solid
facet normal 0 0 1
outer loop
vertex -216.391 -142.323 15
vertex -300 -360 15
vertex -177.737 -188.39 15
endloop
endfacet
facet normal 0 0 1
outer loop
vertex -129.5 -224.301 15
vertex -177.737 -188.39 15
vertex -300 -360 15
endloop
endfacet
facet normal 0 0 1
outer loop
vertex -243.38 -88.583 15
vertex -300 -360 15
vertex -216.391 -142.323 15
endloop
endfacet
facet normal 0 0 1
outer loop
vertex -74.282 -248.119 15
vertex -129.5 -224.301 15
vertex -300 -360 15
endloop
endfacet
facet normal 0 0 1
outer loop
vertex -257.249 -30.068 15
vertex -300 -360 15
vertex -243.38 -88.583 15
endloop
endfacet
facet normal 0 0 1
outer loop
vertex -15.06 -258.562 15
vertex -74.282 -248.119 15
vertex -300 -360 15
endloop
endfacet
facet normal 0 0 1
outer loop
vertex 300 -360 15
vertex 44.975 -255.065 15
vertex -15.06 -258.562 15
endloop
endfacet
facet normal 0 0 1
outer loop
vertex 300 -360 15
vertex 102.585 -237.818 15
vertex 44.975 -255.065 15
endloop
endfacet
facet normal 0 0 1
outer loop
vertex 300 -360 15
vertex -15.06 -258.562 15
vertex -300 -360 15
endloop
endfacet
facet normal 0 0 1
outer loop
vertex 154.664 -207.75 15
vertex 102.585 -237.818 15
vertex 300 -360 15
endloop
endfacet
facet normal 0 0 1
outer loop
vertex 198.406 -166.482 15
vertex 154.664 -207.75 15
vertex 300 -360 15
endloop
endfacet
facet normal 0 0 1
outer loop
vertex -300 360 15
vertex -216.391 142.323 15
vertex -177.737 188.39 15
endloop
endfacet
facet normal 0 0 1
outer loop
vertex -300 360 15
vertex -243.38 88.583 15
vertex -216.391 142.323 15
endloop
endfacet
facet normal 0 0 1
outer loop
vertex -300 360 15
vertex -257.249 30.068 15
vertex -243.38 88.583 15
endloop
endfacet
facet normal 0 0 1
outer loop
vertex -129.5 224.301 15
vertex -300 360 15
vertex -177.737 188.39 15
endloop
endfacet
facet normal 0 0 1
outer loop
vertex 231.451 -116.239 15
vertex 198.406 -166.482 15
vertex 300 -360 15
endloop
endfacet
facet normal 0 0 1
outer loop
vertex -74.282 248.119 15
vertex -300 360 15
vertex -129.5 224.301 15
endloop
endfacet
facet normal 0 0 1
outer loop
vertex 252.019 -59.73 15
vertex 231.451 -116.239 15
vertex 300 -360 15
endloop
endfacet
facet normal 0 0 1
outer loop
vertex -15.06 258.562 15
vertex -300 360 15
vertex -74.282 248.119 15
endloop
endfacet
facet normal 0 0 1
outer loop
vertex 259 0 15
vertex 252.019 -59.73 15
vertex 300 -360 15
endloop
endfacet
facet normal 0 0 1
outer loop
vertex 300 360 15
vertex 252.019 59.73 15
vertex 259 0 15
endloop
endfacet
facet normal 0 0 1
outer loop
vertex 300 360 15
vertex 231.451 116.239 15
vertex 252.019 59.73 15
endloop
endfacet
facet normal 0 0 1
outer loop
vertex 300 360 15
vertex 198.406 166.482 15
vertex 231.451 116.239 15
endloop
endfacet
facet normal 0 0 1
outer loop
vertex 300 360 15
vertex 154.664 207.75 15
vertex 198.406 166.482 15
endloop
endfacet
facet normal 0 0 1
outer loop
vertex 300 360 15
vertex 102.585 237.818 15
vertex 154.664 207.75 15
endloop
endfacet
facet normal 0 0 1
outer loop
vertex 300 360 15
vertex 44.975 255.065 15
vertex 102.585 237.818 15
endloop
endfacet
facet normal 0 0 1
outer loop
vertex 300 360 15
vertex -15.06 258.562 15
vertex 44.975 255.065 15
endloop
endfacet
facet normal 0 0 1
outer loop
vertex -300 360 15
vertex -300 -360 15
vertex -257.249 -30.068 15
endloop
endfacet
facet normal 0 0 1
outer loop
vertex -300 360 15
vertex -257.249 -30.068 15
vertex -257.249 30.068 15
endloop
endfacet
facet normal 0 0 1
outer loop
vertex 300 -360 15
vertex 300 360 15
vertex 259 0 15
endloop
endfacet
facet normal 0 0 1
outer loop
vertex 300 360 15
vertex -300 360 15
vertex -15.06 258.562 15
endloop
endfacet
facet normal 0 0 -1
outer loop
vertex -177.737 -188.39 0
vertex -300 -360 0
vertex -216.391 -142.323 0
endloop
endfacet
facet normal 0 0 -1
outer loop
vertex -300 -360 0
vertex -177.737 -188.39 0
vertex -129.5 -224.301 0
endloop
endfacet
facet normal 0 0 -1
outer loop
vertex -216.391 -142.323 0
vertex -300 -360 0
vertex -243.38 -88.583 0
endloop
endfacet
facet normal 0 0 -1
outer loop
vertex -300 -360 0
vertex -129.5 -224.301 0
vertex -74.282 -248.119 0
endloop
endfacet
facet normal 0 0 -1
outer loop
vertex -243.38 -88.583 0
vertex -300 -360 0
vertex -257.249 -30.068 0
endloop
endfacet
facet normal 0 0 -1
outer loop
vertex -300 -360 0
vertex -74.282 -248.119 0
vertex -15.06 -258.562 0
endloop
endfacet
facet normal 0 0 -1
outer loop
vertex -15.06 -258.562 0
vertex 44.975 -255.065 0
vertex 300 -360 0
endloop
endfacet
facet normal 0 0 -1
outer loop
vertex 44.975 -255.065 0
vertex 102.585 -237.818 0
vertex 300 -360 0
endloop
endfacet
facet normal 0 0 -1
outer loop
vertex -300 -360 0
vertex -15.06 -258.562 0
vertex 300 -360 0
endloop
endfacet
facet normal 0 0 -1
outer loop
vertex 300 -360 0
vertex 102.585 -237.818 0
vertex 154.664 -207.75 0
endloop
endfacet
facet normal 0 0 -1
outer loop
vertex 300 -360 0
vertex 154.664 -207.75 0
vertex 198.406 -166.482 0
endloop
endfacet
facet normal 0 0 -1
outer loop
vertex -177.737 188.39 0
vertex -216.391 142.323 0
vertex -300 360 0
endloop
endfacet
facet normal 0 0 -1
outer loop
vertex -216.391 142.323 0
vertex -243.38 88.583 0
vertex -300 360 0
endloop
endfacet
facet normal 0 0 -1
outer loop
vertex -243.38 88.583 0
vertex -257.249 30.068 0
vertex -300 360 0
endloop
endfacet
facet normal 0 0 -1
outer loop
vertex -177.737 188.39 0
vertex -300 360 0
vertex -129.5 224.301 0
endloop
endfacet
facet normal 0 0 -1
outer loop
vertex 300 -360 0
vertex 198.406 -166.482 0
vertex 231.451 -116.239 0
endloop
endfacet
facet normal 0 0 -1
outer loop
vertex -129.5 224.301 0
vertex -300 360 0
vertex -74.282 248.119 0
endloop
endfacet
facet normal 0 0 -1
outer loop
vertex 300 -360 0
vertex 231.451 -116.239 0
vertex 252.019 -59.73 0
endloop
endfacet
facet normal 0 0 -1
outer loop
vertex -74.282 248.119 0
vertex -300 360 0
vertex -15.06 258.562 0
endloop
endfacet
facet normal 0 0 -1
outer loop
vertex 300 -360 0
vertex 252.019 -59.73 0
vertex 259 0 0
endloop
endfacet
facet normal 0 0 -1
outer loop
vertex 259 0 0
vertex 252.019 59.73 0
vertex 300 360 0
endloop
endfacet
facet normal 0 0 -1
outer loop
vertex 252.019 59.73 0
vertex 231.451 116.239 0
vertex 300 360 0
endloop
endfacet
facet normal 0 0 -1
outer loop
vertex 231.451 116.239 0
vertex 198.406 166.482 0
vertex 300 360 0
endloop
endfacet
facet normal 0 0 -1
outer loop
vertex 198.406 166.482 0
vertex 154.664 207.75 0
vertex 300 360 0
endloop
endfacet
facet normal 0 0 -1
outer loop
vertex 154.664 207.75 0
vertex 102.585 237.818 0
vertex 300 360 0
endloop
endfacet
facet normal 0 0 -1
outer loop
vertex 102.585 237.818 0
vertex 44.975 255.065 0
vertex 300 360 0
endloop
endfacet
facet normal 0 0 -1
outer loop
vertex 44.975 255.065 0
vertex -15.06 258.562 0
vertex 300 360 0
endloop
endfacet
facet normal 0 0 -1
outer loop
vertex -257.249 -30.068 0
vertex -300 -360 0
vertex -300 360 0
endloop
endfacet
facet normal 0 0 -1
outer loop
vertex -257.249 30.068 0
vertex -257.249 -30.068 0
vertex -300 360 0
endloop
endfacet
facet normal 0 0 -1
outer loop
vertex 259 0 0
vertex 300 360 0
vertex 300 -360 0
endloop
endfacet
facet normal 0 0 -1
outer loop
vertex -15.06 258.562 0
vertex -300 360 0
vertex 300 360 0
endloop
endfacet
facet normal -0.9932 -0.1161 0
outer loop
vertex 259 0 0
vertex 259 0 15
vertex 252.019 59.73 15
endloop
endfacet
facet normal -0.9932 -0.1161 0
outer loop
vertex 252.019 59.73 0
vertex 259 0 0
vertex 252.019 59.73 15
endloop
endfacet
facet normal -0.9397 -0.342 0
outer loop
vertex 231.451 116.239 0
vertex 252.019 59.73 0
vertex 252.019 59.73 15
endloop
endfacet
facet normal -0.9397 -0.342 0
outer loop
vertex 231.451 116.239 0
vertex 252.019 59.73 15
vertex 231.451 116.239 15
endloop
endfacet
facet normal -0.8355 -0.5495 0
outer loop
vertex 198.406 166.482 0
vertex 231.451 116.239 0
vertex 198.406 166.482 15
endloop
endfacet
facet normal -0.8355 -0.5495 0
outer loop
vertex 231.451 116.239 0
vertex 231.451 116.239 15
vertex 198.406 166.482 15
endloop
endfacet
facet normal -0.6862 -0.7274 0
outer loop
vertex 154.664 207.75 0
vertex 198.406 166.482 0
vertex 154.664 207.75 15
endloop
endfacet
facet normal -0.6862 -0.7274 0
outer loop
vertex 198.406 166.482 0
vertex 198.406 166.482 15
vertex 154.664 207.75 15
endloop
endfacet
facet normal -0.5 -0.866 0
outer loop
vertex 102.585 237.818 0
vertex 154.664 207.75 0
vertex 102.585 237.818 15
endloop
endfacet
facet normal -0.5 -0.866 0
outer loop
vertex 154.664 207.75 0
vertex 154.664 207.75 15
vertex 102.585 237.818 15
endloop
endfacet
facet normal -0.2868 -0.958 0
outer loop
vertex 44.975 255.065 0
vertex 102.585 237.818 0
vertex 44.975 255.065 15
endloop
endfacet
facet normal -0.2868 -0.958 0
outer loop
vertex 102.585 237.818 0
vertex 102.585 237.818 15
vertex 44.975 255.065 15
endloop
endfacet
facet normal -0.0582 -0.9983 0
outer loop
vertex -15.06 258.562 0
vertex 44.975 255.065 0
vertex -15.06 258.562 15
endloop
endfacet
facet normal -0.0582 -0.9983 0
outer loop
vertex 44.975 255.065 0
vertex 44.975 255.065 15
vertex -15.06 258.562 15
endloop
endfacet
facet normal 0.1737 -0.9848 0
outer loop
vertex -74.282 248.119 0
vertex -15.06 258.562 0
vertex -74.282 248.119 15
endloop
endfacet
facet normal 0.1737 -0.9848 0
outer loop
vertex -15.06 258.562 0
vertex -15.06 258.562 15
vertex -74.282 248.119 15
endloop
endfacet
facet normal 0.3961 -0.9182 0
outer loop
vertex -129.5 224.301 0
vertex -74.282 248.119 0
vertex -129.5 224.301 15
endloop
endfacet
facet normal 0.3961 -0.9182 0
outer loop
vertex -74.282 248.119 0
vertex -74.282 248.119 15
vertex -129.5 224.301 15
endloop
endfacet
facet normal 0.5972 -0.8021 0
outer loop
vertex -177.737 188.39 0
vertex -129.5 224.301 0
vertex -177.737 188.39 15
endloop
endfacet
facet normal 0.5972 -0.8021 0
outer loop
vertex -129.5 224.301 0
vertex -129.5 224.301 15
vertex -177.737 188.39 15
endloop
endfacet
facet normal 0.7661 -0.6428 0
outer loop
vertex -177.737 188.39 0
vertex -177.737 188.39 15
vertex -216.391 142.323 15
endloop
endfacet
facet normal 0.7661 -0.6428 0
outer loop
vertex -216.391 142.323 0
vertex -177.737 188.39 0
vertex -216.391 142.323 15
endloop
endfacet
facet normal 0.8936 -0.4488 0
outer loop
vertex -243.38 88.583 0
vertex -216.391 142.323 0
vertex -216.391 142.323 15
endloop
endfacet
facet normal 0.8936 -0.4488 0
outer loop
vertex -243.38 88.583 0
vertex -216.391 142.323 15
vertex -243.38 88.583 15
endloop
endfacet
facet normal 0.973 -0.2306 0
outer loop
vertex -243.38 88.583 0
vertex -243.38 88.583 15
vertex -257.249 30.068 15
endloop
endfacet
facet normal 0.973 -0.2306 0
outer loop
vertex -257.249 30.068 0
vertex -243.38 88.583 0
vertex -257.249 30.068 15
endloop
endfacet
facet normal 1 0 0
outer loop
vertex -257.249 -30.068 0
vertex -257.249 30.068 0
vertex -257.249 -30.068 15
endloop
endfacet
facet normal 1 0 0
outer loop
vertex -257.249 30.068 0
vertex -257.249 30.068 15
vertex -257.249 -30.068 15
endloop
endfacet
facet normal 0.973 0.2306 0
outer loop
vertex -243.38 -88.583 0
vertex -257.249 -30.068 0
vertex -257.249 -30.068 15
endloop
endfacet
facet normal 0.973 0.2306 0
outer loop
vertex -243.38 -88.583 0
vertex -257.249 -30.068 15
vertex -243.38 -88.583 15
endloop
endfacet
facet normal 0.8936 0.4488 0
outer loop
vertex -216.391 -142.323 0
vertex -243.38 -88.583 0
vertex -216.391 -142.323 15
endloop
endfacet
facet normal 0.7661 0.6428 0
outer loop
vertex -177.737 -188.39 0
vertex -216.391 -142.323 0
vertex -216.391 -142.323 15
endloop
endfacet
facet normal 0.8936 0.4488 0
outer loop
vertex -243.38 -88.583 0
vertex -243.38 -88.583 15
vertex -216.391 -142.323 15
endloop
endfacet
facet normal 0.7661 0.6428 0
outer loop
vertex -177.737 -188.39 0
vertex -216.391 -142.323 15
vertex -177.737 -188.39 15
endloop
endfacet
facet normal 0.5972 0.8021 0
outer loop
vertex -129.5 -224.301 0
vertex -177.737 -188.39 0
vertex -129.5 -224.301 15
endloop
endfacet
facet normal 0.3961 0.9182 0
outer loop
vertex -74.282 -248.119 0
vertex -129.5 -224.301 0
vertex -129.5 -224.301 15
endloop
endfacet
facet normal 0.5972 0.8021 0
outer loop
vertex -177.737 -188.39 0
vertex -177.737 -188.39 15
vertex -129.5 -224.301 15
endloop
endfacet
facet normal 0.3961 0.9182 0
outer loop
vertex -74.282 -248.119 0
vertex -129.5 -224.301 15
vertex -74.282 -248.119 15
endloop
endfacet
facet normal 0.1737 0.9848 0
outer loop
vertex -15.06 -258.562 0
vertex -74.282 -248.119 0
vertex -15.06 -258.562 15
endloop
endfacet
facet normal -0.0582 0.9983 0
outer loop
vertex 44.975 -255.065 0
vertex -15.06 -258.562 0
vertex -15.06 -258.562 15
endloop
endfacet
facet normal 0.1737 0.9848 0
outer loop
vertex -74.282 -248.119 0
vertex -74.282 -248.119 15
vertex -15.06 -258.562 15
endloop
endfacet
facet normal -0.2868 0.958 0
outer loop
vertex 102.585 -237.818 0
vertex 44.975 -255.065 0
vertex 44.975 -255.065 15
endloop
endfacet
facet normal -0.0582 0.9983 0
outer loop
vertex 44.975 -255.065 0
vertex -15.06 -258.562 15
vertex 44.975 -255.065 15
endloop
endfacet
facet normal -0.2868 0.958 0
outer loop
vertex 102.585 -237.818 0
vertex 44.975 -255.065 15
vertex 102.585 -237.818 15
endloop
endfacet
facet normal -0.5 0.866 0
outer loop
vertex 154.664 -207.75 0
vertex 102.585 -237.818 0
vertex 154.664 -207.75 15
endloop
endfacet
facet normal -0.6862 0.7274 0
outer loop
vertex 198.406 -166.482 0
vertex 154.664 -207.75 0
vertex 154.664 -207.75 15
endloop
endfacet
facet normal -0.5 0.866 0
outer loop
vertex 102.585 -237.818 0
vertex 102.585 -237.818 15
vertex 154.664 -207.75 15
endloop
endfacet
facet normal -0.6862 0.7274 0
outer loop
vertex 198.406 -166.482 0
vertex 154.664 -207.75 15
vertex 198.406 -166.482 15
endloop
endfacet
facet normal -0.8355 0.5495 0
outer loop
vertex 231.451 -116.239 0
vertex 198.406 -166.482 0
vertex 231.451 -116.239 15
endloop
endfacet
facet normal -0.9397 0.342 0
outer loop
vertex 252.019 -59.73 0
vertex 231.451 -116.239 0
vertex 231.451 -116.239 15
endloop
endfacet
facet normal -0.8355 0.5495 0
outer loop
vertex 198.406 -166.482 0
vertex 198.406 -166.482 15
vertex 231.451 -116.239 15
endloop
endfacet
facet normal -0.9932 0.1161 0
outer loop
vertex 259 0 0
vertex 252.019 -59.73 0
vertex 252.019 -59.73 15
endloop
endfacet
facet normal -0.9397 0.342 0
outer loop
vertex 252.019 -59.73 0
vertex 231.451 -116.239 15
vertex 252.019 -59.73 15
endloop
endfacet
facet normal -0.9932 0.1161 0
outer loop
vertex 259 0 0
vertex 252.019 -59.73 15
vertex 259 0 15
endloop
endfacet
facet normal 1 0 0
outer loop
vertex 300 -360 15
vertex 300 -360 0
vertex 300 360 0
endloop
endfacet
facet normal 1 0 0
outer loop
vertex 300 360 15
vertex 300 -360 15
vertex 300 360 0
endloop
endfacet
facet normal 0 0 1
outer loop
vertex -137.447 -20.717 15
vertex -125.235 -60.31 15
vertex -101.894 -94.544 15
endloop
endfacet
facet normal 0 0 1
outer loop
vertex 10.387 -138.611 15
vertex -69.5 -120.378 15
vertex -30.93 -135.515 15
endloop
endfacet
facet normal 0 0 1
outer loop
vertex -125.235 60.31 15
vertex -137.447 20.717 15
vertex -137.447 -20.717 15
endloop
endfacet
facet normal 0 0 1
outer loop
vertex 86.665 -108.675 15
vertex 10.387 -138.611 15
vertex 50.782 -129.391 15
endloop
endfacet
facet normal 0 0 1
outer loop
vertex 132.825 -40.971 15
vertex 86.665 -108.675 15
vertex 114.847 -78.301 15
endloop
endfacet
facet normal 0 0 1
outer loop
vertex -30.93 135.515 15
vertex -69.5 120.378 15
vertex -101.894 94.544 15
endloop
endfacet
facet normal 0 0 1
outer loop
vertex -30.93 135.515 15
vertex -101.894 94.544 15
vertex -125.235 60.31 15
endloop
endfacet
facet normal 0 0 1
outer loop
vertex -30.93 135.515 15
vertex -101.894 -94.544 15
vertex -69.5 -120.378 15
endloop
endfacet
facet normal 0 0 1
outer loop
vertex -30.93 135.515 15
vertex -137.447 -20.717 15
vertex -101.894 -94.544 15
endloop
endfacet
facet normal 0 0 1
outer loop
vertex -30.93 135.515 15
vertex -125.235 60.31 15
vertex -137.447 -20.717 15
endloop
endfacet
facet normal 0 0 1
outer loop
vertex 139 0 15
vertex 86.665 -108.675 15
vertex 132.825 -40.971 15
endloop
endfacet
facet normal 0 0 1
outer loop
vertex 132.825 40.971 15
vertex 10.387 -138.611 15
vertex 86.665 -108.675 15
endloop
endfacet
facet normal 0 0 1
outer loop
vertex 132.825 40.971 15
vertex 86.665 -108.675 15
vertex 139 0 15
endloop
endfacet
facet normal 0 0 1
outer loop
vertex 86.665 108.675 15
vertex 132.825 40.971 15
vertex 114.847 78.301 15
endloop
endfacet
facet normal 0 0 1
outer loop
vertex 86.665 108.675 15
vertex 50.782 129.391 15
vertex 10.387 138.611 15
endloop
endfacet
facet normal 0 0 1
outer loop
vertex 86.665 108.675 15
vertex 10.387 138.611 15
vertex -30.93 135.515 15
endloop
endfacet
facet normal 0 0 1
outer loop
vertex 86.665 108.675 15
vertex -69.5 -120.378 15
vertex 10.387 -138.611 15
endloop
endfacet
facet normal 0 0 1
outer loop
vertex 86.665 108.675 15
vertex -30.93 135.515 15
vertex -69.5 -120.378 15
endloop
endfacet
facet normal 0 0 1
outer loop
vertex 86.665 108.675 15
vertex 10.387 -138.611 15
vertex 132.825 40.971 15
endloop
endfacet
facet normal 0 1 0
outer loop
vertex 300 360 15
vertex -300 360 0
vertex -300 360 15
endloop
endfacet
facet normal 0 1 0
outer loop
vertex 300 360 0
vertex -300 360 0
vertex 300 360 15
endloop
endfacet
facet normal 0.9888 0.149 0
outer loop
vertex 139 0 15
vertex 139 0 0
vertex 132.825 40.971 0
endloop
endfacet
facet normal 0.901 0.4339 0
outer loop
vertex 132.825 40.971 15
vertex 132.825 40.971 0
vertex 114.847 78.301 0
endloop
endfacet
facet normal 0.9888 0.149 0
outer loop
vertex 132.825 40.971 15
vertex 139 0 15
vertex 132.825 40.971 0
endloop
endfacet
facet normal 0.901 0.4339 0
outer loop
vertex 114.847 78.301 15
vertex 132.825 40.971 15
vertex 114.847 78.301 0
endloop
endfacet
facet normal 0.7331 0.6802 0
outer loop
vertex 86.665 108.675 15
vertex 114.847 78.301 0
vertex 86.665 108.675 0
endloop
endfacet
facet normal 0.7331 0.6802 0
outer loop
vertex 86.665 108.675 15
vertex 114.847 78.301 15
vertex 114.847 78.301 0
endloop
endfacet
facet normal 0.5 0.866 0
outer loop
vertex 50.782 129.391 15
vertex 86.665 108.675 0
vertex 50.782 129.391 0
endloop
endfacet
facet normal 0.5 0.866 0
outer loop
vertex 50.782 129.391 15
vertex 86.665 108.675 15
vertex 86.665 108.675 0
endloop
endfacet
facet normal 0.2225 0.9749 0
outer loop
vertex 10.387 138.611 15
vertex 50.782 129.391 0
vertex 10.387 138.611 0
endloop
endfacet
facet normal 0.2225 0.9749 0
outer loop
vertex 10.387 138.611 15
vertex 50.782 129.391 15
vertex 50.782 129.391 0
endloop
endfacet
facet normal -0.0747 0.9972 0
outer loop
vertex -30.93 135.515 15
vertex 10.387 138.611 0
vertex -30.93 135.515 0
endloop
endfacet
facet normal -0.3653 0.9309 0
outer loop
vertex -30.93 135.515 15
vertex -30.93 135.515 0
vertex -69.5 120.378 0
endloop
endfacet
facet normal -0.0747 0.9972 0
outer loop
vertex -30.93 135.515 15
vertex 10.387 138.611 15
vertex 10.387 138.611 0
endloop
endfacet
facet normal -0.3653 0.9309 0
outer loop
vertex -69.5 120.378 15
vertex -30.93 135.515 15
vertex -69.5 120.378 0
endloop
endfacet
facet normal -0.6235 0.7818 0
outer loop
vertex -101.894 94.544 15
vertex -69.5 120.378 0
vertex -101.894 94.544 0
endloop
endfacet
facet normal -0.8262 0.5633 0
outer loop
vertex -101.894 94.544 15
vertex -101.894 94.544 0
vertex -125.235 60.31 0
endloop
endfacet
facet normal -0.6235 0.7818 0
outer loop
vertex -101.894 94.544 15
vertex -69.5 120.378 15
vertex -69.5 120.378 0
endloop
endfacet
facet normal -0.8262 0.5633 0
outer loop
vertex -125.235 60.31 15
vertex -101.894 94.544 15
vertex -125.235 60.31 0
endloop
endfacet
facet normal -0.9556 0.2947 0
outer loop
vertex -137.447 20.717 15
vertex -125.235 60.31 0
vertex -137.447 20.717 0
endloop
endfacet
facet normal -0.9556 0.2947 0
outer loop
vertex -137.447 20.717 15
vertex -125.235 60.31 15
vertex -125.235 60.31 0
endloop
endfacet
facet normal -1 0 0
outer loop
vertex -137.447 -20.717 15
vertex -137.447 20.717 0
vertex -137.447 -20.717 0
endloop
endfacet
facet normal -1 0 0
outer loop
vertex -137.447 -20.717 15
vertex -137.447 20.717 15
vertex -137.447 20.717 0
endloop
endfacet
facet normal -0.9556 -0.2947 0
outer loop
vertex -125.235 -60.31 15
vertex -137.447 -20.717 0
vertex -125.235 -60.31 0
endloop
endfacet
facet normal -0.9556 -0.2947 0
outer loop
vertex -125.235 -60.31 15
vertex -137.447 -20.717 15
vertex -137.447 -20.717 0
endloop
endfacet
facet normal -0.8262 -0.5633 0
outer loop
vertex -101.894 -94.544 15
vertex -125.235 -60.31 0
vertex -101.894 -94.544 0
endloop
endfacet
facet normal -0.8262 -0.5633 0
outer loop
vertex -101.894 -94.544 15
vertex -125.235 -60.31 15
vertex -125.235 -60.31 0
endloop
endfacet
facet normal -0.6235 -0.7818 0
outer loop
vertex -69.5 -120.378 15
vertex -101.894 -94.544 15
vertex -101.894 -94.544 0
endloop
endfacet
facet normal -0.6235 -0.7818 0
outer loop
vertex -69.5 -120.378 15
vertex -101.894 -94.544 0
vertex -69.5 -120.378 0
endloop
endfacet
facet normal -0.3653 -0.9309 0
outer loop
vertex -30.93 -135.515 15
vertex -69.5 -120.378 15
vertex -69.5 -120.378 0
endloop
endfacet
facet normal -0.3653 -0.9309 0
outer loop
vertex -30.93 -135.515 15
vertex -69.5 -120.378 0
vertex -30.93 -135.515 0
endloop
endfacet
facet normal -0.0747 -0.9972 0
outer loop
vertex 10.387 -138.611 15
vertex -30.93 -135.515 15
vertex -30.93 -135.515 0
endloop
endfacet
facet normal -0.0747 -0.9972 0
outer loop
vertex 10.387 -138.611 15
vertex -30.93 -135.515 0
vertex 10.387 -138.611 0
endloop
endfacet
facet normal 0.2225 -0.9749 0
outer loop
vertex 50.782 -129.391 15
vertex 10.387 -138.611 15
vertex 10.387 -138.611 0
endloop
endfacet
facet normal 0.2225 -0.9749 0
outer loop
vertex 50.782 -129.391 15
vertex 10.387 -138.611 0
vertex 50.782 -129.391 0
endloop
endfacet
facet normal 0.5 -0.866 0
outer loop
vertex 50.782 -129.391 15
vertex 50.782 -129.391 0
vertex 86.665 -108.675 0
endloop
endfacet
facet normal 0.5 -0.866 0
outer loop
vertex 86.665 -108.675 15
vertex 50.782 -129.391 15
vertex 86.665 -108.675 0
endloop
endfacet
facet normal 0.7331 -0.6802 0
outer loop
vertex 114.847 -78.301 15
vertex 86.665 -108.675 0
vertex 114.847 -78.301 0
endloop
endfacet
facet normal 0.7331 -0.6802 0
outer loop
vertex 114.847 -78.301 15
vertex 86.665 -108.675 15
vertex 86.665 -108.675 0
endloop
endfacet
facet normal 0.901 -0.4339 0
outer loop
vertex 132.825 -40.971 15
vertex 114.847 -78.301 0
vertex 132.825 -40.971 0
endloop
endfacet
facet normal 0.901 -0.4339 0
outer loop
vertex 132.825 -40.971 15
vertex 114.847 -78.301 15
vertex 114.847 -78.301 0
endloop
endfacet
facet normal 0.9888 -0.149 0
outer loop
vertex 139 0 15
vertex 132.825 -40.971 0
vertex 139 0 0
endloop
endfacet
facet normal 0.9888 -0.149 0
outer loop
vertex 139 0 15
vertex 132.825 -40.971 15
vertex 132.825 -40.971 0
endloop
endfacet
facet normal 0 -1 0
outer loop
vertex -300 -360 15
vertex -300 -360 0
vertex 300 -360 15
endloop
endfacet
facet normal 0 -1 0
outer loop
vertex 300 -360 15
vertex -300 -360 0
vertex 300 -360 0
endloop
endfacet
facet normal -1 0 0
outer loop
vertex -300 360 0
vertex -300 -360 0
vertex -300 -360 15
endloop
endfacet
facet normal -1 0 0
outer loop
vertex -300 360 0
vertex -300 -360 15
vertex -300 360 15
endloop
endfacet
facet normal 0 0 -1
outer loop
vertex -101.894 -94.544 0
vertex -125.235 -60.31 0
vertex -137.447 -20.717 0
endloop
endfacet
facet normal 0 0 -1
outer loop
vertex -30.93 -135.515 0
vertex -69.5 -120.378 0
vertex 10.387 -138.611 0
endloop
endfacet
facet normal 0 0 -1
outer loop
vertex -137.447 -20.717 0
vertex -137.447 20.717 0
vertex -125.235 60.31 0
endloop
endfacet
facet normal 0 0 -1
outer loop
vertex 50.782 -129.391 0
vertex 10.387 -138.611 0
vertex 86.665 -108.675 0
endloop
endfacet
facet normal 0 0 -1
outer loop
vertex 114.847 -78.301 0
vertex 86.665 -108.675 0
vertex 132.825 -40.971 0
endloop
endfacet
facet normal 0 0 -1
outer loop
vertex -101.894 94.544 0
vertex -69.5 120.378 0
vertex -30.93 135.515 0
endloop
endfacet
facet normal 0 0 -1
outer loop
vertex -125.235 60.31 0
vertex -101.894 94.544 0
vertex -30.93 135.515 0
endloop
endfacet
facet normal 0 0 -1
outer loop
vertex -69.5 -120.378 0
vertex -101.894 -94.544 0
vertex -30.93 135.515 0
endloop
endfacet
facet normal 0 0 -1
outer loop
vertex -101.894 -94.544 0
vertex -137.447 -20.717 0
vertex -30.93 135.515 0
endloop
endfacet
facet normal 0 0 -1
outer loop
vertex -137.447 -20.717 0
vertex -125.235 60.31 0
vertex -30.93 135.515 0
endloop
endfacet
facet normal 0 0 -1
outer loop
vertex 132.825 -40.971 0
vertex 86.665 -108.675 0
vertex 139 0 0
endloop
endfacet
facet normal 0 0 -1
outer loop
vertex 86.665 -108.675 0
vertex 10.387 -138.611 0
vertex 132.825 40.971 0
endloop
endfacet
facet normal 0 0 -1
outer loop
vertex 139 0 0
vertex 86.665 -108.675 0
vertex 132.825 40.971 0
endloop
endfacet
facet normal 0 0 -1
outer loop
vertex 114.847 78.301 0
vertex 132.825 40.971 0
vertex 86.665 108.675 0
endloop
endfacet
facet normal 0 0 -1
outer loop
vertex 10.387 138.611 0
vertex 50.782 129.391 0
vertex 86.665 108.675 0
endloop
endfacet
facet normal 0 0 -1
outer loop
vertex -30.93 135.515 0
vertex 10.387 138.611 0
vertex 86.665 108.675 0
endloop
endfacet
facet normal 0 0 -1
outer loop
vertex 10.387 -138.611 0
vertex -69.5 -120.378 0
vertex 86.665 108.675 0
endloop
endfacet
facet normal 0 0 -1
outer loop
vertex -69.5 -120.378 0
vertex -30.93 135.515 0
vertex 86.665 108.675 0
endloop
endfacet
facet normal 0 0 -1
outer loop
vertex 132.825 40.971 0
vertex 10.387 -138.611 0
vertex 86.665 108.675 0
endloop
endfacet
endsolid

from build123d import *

# Parameters (mm, degrees)
ESQUISSE1_W             = 600
ESQUISSE1_H             = 720
BOSS_EXTRU_1_DEPTH      = 15
ESQUISSE2_R             = 259
ESQUISSE2_R_2           = 139
ENL_V_MAT_EXTRU_1_DEPTH = 15


with BuildPart() as part:
    # Esquisse1 → Boss.-Extru.1 (new body)
    with BuildSketch(Plane.XY):
        Rectangle(ESQUISSE1_W, ESQUISSE1_H)
    extrude(amount=BOSS_EXTRU_1_DEPTH)

    # Esquisse2 → Enlèv. mat.-Extru.1 (cut)
    with BuildSketch(Plane.XY.offset(15)):
        Circle(ESQUISSE2_R)
        Circle(ESQUISSE2_R_2, mode=Mode.SUBTRACT)
    extrude(amount=-ENL_V_MAT_EXTRU_1_DEPTH, mode=Mode.SUBTRACT)


with BuildPart() as enl_v_mat_extru_1_piece_1:
    # of the separate pieces the step leaves, piece 1, a body of its own (enl_v_mat_extru_1_pieces)
    add(part.part.solids().sort_by_distance((300, -360, 0))[0])


with BuildPart() as enl_v_mat_extru_1_piece_2:
    # of the separate pieces the step leaves, piece 2, a body of its own (enl_v_mat_extru_1_pieces)
    add(part.part.solids().sort_by_distance((139, 0, 0))[0])


solid = Compound([enl_v_mat_extru_1_piece_1.part, enl_v_mat_extru_1_piece_2.part])
